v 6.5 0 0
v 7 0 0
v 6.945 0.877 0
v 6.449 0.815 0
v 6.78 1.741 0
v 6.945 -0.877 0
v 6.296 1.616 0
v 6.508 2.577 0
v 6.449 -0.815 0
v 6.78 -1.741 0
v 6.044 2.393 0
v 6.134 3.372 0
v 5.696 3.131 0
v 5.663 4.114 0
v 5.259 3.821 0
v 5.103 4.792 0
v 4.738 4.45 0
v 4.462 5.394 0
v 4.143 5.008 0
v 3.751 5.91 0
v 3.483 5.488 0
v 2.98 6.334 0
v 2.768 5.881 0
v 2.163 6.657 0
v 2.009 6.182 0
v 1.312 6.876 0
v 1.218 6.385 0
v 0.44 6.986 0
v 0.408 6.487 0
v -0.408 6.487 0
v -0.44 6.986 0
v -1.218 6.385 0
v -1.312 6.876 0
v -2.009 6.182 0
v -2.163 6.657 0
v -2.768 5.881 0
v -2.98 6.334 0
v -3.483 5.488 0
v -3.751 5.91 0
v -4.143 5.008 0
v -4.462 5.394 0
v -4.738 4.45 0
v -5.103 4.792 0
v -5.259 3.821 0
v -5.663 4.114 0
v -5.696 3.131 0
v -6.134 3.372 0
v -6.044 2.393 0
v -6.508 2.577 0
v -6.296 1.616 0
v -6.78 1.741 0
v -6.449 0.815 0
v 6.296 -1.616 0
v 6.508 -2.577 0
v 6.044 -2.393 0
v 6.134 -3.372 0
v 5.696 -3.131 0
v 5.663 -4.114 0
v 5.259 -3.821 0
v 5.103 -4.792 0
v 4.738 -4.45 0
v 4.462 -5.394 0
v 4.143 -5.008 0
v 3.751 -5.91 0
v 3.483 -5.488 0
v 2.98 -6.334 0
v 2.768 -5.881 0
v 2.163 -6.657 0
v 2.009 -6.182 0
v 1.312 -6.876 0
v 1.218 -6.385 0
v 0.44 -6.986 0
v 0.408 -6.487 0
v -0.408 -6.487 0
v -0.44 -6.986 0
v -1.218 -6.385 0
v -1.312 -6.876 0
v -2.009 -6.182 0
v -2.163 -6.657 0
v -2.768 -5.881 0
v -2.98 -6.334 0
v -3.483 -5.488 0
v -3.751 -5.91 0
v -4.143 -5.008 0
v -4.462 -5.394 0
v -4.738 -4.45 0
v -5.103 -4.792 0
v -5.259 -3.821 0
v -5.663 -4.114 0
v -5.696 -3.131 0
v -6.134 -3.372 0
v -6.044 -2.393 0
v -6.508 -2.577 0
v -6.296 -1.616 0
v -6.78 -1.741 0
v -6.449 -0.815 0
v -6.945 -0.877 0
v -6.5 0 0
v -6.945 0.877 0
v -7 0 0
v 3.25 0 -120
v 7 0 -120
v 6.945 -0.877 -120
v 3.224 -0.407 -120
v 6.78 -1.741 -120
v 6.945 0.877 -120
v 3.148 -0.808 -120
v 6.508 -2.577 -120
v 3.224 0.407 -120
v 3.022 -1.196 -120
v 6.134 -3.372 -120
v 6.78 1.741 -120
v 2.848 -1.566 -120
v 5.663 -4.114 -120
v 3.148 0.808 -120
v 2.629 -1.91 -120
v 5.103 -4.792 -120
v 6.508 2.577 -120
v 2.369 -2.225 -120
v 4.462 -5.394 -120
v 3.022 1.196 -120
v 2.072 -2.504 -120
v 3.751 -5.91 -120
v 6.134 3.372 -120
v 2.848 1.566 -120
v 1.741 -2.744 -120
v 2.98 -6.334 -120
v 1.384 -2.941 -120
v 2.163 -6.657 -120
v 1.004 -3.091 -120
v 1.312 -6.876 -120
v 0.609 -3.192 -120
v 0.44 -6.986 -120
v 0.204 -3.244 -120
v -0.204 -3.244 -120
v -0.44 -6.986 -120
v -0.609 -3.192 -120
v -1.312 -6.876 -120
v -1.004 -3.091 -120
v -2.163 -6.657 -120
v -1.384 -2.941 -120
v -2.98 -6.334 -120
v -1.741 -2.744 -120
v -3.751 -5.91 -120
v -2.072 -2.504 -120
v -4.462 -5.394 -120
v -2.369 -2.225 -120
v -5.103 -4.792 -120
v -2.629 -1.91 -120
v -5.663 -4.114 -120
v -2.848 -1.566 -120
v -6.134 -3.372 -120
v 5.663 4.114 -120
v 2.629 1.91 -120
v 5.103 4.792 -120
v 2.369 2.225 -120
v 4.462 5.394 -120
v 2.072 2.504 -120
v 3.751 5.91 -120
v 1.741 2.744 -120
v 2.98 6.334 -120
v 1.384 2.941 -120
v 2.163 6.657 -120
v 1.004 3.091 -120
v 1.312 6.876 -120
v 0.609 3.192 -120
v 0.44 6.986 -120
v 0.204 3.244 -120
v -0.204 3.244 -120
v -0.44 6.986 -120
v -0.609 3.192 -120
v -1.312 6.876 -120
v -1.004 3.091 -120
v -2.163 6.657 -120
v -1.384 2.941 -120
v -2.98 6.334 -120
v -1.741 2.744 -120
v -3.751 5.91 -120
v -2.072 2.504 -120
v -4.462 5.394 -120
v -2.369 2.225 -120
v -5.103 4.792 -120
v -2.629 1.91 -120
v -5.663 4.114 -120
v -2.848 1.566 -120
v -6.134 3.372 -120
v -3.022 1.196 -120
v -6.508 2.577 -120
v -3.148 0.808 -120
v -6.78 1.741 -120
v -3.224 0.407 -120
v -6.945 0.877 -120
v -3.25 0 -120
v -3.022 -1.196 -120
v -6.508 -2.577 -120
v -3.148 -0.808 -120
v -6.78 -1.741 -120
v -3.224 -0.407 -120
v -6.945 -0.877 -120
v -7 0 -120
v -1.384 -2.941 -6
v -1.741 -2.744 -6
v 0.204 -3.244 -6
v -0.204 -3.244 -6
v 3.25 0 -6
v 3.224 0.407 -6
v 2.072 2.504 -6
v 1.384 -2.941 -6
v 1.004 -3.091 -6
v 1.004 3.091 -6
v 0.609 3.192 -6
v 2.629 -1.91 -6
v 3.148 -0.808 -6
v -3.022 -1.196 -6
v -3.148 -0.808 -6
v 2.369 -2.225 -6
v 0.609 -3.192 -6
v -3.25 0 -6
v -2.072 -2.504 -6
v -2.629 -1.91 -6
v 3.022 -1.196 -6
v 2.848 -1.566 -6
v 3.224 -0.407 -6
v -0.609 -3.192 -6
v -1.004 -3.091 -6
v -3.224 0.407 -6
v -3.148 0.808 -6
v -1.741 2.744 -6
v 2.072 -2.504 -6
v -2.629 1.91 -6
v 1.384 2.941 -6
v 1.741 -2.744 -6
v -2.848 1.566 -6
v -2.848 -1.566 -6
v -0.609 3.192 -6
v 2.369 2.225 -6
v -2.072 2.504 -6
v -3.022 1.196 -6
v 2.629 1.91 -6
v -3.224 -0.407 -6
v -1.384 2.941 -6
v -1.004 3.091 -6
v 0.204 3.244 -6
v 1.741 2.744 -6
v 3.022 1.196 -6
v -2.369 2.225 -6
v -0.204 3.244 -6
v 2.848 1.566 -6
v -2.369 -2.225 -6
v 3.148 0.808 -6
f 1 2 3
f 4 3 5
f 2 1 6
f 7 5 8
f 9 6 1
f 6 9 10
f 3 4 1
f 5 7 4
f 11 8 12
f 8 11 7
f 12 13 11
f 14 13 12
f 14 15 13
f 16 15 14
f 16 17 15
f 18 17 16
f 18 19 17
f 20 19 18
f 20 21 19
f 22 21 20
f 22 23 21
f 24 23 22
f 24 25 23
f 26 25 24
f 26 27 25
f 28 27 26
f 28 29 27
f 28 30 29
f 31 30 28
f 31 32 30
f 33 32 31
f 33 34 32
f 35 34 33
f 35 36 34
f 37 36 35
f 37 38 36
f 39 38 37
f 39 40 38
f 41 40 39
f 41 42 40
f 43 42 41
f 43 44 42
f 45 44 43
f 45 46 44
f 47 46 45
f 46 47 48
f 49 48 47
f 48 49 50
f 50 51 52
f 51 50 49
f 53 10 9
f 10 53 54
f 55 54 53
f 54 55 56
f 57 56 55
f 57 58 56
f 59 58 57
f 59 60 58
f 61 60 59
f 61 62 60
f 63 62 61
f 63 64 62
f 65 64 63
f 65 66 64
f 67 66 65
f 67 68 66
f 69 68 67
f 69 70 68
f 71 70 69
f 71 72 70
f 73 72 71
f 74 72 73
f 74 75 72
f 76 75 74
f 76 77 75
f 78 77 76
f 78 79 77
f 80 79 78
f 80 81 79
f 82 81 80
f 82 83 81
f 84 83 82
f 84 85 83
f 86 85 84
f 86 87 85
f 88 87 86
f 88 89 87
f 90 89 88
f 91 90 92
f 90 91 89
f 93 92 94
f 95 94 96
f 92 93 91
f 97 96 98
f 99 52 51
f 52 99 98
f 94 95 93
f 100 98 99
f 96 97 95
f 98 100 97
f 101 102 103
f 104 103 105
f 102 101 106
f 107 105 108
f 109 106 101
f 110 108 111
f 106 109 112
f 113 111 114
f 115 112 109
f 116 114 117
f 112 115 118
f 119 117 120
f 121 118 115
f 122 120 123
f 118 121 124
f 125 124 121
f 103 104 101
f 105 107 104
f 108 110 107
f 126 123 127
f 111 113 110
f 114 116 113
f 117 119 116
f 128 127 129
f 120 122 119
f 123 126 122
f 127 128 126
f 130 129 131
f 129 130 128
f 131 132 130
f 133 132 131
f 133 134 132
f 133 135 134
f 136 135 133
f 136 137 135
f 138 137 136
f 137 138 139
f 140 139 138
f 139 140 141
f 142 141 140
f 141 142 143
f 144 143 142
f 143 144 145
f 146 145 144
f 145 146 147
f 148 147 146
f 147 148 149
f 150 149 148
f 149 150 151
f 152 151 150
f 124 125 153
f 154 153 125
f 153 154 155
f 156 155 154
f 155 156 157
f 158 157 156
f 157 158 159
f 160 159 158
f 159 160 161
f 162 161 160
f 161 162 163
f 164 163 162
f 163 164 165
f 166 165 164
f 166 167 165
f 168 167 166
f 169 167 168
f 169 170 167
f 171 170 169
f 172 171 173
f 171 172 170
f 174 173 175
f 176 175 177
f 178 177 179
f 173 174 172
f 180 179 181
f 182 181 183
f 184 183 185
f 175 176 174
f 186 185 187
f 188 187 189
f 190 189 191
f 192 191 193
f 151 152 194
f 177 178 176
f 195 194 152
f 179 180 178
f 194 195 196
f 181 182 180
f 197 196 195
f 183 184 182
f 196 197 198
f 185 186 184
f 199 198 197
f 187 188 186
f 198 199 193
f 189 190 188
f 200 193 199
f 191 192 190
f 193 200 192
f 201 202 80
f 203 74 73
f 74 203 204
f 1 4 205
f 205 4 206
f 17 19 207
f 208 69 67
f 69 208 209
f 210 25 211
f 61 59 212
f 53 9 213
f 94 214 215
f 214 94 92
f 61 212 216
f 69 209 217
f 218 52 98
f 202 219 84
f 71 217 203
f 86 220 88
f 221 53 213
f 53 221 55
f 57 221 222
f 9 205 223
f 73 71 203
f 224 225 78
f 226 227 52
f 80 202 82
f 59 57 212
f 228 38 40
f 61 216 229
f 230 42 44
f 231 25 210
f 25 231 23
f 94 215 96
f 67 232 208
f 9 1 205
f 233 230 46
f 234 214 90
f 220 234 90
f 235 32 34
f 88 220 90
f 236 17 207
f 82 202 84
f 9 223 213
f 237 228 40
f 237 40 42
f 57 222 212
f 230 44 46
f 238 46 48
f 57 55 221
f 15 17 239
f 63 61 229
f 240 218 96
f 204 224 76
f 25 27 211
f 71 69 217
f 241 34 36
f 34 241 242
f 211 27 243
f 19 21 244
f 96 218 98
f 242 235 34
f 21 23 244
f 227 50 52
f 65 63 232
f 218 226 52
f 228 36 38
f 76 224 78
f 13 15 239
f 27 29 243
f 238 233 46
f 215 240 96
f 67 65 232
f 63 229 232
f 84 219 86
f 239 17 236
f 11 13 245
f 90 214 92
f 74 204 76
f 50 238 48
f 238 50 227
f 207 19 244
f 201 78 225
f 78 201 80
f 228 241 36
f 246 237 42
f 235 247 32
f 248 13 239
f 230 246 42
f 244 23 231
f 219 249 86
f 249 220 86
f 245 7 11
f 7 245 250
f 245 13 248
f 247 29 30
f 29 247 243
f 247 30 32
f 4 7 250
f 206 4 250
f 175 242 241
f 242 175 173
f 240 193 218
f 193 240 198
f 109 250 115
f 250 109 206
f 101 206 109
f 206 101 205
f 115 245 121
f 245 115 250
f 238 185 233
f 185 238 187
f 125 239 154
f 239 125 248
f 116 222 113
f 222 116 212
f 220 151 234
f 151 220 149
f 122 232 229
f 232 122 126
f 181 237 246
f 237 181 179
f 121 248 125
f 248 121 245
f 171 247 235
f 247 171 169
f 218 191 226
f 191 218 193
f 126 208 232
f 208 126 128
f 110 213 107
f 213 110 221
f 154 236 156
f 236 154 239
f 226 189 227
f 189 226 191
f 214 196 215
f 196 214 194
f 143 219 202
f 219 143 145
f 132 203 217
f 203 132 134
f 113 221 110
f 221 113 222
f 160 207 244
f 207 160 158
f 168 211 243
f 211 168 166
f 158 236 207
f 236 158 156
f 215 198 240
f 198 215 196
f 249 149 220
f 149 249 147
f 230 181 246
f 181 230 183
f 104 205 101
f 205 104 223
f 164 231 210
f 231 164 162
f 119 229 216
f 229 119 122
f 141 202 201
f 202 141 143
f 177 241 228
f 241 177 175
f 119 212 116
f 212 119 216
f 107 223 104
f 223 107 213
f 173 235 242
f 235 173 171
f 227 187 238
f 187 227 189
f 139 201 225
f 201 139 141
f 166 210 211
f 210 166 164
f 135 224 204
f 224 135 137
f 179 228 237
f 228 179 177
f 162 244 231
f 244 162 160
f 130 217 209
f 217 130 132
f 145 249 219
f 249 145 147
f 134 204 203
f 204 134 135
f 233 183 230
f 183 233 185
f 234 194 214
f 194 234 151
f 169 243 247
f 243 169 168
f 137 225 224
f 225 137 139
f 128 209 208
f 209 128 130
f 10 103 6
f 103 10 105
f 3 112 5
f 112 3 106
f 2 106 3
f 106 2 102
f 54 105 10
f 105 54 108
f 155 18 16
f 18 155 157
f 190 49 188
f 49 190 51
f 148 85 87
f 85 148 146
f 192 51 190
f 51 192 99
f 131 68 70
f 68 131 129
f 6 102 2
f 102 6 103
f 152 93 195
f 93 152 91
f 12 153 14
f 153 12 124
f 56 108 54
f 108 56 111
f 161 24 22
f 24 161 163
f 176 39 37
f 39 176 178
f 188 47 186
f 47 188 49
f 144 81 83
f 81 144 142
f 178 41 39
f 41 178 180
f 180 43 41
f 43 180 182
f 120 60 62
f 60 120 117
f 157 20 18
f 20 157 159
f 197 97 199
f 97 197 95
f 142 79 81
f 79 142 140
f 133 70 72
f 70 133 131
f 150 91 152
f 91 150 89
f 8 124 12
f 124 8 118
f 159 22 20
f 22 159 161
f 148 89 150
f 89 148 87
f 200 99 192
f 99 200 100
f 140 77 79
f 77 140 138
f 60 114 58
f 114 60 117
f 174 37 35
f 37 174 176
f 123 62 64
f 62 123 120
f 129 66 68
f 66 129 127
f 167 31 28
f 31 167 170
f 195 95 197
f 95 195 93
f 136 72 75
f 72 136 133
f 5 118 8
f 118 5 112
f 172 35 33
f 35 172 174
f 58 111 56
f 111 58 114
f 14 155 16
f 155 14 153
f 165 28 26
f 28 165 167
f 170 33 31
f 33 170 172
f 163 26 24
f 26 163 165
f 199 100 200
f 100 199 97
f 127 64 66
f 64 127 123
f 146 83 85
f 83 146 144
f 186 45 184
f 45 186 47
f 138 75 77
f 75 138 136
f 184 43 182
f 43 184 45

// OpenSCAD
$fn = 50;


difference() {
	union() {
		translate(v = [0, 0, -120.0000000000]) {
			cylinder(h = 120, r = 7.0000000000);
		}
		cylinder(h = 0, r = 10.0000000000);
	}
	union() {
		translate(v = [0, 0, 0]) {
			rotate(a = [0, 0, 0]) {
				difference() {
					union() {
						#translate(v = [0, 0, -120.0000000000]) {
							cylinder(h = 120, r = 2.2500000000);
						}
						#translate(v = [0, 0, -6]) {
							cylinder(h = 6, r = 7.0000000000, r1 = 3.2500000000, r2 = 6.5000000000);
						}
						#translate(v = [0, 0, -120.0000000000]) {
							cylinder(h = 120, r = 3.2500000000);
						}
						#translate(v = [0, 0, -120.0000000000]) {
							cylinder(h = 120, r = 2.2500000000);
						}
					}
					union();
				}
			}
		}
	}
}
